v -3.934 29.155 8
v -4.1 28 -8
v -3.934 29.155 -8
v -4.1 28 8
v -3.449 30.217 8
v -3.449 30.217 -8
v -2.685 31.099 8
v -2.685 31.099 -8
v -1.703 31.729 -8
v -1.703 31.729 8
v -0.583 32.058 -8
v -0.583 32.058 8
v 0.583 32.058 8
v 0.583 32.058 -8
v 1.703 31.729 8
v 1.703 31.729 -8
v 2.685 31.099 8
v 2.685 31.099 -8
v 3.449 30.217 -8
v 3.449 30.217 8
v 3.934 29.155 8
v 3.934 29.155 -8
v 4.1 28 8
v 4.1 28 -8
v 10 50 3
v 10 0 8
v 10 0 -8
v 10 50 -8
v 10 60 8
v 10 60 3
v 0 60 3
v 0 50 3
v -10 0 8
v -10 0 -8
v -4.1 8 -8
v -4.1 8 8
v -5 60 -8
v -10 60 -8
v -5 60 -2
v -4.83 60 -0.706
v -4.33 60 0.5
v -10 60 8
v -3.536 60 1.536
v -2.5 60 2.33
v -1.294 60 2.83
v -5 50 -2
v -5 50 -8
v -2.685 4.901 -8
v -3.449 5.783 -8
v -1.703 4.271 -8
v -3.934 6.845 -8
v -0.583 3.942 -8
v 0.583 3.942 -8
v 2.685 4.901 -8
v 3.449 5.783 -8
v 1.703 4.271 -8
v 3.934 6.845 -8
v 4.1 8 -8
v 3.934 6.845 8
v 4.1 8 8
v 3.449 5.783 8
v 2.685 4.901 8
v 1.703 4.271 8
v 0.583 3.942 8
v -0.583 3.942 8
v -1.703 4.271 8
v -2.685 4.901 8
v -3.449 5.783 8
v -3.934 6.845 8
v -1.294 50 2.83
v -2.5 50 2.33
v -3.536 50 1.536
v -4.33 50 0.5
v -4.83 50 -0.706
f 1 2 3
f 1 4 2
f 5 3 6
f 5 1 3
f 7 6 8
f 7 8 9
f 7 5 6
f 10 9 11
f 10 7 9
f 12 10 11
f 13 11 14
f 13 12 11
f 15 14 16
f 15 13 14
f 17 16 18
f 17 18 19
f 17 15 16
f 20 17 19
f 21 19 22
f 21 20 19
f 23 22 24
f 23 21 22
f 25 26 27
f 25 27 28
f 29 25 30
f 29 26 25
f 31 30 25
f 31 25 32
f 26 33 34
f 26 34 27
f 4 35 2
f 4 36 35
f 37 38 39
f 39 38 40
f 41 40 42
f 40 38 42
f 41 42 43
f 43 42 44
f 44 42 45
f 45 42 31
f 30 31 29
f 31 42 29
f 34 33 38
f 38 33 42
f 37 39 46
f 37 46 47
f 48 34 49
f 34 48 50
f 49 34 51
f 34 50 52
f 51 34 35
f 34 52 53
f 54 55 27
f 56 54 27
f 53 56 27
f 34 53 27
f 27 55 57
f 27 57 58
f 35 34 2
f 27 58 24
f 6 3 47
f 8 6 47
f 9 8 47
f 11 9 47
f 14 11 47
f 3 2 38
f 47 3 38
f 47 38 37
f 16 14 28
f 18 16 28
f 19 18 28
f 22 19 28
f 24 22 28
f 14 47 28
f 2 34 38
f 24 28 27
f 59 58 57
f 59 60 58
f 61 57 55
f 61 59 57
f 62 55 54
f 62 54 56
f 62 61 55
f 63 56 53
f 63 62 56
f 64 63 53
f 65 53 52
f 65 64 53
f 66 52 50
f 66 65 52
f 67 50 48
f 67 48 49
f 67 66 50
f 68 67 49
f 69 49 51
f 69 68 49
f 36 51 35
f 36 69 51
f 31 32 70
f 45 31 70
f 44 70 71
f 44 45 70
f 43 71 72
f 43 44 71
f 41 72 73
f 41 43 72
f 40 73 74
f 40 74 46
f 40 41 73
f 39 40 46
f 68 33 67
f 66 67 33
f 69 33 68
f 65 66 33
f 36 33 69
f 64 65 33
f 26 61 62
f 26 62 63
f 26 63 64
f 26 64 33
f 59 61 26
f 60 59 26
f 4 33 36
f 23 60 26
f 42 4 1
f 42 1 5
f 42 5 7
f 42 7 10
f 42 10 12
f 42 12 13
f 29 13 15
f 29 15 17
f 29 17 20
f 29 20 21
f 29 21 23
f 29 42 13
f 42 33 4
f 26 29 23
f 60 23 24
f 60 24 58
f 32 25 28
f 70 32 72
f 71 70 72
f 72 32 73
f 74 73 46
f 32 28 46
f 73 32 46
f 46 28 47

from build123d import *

# Parameters (mm, degrees)
SKETCH1_W           = 20
SKETCH1_H           = 60
BOSS_EXTRUDE1_DEPTH = 8
CUT_EXTRUDE1_DEPTH  = 10


with BuildPart() as part:
    # Sketch1 → Boss-Extrude1 (new body, symmetric)
    with BuildSketch(Plane.XY):
        with Locations((0, 30)):
            Rectangle(SKETCH1_W, SKETCH1_H)
        with BuildLine():
            Line((4.1, 28), (4.1, 8))
            ThreePointArc((4.1, 8), (0, 3.9), (-4.1, 8))
            Line((-4.1, 8), (-4.1, 28))
            ThreePointArc((-4.1, 28), (0, 32.1), (4.1, 28))
        make_face(mode=Mode.SUBTRACT)
    extrude(amount=BOSS_EXTRUDE1_DEPTH, both=True)

    # Sketch2 → Cut-Extrude1 (cut)
    with BuildSketch(Plane(origin=(0, 60, 0), x_dir=(1, 0, 0), z_dir=(0, 1, 0))):
        with BuildLine():
            Line((10, -3), (0, -3))
            ThreePointArc((0, -3), (-3.535533906, -1.535533906), (-5, 2))
            Line((-5, 2), (-5, 8))
            Line((-5, 8), (10, 8))
            Line((10, 8), (10, -3))
        make_face()
    extrude(amount=-CUT_EXTRUDE1_DEPTH, mode=Mode.SUBTRACT)


solid = part.part
